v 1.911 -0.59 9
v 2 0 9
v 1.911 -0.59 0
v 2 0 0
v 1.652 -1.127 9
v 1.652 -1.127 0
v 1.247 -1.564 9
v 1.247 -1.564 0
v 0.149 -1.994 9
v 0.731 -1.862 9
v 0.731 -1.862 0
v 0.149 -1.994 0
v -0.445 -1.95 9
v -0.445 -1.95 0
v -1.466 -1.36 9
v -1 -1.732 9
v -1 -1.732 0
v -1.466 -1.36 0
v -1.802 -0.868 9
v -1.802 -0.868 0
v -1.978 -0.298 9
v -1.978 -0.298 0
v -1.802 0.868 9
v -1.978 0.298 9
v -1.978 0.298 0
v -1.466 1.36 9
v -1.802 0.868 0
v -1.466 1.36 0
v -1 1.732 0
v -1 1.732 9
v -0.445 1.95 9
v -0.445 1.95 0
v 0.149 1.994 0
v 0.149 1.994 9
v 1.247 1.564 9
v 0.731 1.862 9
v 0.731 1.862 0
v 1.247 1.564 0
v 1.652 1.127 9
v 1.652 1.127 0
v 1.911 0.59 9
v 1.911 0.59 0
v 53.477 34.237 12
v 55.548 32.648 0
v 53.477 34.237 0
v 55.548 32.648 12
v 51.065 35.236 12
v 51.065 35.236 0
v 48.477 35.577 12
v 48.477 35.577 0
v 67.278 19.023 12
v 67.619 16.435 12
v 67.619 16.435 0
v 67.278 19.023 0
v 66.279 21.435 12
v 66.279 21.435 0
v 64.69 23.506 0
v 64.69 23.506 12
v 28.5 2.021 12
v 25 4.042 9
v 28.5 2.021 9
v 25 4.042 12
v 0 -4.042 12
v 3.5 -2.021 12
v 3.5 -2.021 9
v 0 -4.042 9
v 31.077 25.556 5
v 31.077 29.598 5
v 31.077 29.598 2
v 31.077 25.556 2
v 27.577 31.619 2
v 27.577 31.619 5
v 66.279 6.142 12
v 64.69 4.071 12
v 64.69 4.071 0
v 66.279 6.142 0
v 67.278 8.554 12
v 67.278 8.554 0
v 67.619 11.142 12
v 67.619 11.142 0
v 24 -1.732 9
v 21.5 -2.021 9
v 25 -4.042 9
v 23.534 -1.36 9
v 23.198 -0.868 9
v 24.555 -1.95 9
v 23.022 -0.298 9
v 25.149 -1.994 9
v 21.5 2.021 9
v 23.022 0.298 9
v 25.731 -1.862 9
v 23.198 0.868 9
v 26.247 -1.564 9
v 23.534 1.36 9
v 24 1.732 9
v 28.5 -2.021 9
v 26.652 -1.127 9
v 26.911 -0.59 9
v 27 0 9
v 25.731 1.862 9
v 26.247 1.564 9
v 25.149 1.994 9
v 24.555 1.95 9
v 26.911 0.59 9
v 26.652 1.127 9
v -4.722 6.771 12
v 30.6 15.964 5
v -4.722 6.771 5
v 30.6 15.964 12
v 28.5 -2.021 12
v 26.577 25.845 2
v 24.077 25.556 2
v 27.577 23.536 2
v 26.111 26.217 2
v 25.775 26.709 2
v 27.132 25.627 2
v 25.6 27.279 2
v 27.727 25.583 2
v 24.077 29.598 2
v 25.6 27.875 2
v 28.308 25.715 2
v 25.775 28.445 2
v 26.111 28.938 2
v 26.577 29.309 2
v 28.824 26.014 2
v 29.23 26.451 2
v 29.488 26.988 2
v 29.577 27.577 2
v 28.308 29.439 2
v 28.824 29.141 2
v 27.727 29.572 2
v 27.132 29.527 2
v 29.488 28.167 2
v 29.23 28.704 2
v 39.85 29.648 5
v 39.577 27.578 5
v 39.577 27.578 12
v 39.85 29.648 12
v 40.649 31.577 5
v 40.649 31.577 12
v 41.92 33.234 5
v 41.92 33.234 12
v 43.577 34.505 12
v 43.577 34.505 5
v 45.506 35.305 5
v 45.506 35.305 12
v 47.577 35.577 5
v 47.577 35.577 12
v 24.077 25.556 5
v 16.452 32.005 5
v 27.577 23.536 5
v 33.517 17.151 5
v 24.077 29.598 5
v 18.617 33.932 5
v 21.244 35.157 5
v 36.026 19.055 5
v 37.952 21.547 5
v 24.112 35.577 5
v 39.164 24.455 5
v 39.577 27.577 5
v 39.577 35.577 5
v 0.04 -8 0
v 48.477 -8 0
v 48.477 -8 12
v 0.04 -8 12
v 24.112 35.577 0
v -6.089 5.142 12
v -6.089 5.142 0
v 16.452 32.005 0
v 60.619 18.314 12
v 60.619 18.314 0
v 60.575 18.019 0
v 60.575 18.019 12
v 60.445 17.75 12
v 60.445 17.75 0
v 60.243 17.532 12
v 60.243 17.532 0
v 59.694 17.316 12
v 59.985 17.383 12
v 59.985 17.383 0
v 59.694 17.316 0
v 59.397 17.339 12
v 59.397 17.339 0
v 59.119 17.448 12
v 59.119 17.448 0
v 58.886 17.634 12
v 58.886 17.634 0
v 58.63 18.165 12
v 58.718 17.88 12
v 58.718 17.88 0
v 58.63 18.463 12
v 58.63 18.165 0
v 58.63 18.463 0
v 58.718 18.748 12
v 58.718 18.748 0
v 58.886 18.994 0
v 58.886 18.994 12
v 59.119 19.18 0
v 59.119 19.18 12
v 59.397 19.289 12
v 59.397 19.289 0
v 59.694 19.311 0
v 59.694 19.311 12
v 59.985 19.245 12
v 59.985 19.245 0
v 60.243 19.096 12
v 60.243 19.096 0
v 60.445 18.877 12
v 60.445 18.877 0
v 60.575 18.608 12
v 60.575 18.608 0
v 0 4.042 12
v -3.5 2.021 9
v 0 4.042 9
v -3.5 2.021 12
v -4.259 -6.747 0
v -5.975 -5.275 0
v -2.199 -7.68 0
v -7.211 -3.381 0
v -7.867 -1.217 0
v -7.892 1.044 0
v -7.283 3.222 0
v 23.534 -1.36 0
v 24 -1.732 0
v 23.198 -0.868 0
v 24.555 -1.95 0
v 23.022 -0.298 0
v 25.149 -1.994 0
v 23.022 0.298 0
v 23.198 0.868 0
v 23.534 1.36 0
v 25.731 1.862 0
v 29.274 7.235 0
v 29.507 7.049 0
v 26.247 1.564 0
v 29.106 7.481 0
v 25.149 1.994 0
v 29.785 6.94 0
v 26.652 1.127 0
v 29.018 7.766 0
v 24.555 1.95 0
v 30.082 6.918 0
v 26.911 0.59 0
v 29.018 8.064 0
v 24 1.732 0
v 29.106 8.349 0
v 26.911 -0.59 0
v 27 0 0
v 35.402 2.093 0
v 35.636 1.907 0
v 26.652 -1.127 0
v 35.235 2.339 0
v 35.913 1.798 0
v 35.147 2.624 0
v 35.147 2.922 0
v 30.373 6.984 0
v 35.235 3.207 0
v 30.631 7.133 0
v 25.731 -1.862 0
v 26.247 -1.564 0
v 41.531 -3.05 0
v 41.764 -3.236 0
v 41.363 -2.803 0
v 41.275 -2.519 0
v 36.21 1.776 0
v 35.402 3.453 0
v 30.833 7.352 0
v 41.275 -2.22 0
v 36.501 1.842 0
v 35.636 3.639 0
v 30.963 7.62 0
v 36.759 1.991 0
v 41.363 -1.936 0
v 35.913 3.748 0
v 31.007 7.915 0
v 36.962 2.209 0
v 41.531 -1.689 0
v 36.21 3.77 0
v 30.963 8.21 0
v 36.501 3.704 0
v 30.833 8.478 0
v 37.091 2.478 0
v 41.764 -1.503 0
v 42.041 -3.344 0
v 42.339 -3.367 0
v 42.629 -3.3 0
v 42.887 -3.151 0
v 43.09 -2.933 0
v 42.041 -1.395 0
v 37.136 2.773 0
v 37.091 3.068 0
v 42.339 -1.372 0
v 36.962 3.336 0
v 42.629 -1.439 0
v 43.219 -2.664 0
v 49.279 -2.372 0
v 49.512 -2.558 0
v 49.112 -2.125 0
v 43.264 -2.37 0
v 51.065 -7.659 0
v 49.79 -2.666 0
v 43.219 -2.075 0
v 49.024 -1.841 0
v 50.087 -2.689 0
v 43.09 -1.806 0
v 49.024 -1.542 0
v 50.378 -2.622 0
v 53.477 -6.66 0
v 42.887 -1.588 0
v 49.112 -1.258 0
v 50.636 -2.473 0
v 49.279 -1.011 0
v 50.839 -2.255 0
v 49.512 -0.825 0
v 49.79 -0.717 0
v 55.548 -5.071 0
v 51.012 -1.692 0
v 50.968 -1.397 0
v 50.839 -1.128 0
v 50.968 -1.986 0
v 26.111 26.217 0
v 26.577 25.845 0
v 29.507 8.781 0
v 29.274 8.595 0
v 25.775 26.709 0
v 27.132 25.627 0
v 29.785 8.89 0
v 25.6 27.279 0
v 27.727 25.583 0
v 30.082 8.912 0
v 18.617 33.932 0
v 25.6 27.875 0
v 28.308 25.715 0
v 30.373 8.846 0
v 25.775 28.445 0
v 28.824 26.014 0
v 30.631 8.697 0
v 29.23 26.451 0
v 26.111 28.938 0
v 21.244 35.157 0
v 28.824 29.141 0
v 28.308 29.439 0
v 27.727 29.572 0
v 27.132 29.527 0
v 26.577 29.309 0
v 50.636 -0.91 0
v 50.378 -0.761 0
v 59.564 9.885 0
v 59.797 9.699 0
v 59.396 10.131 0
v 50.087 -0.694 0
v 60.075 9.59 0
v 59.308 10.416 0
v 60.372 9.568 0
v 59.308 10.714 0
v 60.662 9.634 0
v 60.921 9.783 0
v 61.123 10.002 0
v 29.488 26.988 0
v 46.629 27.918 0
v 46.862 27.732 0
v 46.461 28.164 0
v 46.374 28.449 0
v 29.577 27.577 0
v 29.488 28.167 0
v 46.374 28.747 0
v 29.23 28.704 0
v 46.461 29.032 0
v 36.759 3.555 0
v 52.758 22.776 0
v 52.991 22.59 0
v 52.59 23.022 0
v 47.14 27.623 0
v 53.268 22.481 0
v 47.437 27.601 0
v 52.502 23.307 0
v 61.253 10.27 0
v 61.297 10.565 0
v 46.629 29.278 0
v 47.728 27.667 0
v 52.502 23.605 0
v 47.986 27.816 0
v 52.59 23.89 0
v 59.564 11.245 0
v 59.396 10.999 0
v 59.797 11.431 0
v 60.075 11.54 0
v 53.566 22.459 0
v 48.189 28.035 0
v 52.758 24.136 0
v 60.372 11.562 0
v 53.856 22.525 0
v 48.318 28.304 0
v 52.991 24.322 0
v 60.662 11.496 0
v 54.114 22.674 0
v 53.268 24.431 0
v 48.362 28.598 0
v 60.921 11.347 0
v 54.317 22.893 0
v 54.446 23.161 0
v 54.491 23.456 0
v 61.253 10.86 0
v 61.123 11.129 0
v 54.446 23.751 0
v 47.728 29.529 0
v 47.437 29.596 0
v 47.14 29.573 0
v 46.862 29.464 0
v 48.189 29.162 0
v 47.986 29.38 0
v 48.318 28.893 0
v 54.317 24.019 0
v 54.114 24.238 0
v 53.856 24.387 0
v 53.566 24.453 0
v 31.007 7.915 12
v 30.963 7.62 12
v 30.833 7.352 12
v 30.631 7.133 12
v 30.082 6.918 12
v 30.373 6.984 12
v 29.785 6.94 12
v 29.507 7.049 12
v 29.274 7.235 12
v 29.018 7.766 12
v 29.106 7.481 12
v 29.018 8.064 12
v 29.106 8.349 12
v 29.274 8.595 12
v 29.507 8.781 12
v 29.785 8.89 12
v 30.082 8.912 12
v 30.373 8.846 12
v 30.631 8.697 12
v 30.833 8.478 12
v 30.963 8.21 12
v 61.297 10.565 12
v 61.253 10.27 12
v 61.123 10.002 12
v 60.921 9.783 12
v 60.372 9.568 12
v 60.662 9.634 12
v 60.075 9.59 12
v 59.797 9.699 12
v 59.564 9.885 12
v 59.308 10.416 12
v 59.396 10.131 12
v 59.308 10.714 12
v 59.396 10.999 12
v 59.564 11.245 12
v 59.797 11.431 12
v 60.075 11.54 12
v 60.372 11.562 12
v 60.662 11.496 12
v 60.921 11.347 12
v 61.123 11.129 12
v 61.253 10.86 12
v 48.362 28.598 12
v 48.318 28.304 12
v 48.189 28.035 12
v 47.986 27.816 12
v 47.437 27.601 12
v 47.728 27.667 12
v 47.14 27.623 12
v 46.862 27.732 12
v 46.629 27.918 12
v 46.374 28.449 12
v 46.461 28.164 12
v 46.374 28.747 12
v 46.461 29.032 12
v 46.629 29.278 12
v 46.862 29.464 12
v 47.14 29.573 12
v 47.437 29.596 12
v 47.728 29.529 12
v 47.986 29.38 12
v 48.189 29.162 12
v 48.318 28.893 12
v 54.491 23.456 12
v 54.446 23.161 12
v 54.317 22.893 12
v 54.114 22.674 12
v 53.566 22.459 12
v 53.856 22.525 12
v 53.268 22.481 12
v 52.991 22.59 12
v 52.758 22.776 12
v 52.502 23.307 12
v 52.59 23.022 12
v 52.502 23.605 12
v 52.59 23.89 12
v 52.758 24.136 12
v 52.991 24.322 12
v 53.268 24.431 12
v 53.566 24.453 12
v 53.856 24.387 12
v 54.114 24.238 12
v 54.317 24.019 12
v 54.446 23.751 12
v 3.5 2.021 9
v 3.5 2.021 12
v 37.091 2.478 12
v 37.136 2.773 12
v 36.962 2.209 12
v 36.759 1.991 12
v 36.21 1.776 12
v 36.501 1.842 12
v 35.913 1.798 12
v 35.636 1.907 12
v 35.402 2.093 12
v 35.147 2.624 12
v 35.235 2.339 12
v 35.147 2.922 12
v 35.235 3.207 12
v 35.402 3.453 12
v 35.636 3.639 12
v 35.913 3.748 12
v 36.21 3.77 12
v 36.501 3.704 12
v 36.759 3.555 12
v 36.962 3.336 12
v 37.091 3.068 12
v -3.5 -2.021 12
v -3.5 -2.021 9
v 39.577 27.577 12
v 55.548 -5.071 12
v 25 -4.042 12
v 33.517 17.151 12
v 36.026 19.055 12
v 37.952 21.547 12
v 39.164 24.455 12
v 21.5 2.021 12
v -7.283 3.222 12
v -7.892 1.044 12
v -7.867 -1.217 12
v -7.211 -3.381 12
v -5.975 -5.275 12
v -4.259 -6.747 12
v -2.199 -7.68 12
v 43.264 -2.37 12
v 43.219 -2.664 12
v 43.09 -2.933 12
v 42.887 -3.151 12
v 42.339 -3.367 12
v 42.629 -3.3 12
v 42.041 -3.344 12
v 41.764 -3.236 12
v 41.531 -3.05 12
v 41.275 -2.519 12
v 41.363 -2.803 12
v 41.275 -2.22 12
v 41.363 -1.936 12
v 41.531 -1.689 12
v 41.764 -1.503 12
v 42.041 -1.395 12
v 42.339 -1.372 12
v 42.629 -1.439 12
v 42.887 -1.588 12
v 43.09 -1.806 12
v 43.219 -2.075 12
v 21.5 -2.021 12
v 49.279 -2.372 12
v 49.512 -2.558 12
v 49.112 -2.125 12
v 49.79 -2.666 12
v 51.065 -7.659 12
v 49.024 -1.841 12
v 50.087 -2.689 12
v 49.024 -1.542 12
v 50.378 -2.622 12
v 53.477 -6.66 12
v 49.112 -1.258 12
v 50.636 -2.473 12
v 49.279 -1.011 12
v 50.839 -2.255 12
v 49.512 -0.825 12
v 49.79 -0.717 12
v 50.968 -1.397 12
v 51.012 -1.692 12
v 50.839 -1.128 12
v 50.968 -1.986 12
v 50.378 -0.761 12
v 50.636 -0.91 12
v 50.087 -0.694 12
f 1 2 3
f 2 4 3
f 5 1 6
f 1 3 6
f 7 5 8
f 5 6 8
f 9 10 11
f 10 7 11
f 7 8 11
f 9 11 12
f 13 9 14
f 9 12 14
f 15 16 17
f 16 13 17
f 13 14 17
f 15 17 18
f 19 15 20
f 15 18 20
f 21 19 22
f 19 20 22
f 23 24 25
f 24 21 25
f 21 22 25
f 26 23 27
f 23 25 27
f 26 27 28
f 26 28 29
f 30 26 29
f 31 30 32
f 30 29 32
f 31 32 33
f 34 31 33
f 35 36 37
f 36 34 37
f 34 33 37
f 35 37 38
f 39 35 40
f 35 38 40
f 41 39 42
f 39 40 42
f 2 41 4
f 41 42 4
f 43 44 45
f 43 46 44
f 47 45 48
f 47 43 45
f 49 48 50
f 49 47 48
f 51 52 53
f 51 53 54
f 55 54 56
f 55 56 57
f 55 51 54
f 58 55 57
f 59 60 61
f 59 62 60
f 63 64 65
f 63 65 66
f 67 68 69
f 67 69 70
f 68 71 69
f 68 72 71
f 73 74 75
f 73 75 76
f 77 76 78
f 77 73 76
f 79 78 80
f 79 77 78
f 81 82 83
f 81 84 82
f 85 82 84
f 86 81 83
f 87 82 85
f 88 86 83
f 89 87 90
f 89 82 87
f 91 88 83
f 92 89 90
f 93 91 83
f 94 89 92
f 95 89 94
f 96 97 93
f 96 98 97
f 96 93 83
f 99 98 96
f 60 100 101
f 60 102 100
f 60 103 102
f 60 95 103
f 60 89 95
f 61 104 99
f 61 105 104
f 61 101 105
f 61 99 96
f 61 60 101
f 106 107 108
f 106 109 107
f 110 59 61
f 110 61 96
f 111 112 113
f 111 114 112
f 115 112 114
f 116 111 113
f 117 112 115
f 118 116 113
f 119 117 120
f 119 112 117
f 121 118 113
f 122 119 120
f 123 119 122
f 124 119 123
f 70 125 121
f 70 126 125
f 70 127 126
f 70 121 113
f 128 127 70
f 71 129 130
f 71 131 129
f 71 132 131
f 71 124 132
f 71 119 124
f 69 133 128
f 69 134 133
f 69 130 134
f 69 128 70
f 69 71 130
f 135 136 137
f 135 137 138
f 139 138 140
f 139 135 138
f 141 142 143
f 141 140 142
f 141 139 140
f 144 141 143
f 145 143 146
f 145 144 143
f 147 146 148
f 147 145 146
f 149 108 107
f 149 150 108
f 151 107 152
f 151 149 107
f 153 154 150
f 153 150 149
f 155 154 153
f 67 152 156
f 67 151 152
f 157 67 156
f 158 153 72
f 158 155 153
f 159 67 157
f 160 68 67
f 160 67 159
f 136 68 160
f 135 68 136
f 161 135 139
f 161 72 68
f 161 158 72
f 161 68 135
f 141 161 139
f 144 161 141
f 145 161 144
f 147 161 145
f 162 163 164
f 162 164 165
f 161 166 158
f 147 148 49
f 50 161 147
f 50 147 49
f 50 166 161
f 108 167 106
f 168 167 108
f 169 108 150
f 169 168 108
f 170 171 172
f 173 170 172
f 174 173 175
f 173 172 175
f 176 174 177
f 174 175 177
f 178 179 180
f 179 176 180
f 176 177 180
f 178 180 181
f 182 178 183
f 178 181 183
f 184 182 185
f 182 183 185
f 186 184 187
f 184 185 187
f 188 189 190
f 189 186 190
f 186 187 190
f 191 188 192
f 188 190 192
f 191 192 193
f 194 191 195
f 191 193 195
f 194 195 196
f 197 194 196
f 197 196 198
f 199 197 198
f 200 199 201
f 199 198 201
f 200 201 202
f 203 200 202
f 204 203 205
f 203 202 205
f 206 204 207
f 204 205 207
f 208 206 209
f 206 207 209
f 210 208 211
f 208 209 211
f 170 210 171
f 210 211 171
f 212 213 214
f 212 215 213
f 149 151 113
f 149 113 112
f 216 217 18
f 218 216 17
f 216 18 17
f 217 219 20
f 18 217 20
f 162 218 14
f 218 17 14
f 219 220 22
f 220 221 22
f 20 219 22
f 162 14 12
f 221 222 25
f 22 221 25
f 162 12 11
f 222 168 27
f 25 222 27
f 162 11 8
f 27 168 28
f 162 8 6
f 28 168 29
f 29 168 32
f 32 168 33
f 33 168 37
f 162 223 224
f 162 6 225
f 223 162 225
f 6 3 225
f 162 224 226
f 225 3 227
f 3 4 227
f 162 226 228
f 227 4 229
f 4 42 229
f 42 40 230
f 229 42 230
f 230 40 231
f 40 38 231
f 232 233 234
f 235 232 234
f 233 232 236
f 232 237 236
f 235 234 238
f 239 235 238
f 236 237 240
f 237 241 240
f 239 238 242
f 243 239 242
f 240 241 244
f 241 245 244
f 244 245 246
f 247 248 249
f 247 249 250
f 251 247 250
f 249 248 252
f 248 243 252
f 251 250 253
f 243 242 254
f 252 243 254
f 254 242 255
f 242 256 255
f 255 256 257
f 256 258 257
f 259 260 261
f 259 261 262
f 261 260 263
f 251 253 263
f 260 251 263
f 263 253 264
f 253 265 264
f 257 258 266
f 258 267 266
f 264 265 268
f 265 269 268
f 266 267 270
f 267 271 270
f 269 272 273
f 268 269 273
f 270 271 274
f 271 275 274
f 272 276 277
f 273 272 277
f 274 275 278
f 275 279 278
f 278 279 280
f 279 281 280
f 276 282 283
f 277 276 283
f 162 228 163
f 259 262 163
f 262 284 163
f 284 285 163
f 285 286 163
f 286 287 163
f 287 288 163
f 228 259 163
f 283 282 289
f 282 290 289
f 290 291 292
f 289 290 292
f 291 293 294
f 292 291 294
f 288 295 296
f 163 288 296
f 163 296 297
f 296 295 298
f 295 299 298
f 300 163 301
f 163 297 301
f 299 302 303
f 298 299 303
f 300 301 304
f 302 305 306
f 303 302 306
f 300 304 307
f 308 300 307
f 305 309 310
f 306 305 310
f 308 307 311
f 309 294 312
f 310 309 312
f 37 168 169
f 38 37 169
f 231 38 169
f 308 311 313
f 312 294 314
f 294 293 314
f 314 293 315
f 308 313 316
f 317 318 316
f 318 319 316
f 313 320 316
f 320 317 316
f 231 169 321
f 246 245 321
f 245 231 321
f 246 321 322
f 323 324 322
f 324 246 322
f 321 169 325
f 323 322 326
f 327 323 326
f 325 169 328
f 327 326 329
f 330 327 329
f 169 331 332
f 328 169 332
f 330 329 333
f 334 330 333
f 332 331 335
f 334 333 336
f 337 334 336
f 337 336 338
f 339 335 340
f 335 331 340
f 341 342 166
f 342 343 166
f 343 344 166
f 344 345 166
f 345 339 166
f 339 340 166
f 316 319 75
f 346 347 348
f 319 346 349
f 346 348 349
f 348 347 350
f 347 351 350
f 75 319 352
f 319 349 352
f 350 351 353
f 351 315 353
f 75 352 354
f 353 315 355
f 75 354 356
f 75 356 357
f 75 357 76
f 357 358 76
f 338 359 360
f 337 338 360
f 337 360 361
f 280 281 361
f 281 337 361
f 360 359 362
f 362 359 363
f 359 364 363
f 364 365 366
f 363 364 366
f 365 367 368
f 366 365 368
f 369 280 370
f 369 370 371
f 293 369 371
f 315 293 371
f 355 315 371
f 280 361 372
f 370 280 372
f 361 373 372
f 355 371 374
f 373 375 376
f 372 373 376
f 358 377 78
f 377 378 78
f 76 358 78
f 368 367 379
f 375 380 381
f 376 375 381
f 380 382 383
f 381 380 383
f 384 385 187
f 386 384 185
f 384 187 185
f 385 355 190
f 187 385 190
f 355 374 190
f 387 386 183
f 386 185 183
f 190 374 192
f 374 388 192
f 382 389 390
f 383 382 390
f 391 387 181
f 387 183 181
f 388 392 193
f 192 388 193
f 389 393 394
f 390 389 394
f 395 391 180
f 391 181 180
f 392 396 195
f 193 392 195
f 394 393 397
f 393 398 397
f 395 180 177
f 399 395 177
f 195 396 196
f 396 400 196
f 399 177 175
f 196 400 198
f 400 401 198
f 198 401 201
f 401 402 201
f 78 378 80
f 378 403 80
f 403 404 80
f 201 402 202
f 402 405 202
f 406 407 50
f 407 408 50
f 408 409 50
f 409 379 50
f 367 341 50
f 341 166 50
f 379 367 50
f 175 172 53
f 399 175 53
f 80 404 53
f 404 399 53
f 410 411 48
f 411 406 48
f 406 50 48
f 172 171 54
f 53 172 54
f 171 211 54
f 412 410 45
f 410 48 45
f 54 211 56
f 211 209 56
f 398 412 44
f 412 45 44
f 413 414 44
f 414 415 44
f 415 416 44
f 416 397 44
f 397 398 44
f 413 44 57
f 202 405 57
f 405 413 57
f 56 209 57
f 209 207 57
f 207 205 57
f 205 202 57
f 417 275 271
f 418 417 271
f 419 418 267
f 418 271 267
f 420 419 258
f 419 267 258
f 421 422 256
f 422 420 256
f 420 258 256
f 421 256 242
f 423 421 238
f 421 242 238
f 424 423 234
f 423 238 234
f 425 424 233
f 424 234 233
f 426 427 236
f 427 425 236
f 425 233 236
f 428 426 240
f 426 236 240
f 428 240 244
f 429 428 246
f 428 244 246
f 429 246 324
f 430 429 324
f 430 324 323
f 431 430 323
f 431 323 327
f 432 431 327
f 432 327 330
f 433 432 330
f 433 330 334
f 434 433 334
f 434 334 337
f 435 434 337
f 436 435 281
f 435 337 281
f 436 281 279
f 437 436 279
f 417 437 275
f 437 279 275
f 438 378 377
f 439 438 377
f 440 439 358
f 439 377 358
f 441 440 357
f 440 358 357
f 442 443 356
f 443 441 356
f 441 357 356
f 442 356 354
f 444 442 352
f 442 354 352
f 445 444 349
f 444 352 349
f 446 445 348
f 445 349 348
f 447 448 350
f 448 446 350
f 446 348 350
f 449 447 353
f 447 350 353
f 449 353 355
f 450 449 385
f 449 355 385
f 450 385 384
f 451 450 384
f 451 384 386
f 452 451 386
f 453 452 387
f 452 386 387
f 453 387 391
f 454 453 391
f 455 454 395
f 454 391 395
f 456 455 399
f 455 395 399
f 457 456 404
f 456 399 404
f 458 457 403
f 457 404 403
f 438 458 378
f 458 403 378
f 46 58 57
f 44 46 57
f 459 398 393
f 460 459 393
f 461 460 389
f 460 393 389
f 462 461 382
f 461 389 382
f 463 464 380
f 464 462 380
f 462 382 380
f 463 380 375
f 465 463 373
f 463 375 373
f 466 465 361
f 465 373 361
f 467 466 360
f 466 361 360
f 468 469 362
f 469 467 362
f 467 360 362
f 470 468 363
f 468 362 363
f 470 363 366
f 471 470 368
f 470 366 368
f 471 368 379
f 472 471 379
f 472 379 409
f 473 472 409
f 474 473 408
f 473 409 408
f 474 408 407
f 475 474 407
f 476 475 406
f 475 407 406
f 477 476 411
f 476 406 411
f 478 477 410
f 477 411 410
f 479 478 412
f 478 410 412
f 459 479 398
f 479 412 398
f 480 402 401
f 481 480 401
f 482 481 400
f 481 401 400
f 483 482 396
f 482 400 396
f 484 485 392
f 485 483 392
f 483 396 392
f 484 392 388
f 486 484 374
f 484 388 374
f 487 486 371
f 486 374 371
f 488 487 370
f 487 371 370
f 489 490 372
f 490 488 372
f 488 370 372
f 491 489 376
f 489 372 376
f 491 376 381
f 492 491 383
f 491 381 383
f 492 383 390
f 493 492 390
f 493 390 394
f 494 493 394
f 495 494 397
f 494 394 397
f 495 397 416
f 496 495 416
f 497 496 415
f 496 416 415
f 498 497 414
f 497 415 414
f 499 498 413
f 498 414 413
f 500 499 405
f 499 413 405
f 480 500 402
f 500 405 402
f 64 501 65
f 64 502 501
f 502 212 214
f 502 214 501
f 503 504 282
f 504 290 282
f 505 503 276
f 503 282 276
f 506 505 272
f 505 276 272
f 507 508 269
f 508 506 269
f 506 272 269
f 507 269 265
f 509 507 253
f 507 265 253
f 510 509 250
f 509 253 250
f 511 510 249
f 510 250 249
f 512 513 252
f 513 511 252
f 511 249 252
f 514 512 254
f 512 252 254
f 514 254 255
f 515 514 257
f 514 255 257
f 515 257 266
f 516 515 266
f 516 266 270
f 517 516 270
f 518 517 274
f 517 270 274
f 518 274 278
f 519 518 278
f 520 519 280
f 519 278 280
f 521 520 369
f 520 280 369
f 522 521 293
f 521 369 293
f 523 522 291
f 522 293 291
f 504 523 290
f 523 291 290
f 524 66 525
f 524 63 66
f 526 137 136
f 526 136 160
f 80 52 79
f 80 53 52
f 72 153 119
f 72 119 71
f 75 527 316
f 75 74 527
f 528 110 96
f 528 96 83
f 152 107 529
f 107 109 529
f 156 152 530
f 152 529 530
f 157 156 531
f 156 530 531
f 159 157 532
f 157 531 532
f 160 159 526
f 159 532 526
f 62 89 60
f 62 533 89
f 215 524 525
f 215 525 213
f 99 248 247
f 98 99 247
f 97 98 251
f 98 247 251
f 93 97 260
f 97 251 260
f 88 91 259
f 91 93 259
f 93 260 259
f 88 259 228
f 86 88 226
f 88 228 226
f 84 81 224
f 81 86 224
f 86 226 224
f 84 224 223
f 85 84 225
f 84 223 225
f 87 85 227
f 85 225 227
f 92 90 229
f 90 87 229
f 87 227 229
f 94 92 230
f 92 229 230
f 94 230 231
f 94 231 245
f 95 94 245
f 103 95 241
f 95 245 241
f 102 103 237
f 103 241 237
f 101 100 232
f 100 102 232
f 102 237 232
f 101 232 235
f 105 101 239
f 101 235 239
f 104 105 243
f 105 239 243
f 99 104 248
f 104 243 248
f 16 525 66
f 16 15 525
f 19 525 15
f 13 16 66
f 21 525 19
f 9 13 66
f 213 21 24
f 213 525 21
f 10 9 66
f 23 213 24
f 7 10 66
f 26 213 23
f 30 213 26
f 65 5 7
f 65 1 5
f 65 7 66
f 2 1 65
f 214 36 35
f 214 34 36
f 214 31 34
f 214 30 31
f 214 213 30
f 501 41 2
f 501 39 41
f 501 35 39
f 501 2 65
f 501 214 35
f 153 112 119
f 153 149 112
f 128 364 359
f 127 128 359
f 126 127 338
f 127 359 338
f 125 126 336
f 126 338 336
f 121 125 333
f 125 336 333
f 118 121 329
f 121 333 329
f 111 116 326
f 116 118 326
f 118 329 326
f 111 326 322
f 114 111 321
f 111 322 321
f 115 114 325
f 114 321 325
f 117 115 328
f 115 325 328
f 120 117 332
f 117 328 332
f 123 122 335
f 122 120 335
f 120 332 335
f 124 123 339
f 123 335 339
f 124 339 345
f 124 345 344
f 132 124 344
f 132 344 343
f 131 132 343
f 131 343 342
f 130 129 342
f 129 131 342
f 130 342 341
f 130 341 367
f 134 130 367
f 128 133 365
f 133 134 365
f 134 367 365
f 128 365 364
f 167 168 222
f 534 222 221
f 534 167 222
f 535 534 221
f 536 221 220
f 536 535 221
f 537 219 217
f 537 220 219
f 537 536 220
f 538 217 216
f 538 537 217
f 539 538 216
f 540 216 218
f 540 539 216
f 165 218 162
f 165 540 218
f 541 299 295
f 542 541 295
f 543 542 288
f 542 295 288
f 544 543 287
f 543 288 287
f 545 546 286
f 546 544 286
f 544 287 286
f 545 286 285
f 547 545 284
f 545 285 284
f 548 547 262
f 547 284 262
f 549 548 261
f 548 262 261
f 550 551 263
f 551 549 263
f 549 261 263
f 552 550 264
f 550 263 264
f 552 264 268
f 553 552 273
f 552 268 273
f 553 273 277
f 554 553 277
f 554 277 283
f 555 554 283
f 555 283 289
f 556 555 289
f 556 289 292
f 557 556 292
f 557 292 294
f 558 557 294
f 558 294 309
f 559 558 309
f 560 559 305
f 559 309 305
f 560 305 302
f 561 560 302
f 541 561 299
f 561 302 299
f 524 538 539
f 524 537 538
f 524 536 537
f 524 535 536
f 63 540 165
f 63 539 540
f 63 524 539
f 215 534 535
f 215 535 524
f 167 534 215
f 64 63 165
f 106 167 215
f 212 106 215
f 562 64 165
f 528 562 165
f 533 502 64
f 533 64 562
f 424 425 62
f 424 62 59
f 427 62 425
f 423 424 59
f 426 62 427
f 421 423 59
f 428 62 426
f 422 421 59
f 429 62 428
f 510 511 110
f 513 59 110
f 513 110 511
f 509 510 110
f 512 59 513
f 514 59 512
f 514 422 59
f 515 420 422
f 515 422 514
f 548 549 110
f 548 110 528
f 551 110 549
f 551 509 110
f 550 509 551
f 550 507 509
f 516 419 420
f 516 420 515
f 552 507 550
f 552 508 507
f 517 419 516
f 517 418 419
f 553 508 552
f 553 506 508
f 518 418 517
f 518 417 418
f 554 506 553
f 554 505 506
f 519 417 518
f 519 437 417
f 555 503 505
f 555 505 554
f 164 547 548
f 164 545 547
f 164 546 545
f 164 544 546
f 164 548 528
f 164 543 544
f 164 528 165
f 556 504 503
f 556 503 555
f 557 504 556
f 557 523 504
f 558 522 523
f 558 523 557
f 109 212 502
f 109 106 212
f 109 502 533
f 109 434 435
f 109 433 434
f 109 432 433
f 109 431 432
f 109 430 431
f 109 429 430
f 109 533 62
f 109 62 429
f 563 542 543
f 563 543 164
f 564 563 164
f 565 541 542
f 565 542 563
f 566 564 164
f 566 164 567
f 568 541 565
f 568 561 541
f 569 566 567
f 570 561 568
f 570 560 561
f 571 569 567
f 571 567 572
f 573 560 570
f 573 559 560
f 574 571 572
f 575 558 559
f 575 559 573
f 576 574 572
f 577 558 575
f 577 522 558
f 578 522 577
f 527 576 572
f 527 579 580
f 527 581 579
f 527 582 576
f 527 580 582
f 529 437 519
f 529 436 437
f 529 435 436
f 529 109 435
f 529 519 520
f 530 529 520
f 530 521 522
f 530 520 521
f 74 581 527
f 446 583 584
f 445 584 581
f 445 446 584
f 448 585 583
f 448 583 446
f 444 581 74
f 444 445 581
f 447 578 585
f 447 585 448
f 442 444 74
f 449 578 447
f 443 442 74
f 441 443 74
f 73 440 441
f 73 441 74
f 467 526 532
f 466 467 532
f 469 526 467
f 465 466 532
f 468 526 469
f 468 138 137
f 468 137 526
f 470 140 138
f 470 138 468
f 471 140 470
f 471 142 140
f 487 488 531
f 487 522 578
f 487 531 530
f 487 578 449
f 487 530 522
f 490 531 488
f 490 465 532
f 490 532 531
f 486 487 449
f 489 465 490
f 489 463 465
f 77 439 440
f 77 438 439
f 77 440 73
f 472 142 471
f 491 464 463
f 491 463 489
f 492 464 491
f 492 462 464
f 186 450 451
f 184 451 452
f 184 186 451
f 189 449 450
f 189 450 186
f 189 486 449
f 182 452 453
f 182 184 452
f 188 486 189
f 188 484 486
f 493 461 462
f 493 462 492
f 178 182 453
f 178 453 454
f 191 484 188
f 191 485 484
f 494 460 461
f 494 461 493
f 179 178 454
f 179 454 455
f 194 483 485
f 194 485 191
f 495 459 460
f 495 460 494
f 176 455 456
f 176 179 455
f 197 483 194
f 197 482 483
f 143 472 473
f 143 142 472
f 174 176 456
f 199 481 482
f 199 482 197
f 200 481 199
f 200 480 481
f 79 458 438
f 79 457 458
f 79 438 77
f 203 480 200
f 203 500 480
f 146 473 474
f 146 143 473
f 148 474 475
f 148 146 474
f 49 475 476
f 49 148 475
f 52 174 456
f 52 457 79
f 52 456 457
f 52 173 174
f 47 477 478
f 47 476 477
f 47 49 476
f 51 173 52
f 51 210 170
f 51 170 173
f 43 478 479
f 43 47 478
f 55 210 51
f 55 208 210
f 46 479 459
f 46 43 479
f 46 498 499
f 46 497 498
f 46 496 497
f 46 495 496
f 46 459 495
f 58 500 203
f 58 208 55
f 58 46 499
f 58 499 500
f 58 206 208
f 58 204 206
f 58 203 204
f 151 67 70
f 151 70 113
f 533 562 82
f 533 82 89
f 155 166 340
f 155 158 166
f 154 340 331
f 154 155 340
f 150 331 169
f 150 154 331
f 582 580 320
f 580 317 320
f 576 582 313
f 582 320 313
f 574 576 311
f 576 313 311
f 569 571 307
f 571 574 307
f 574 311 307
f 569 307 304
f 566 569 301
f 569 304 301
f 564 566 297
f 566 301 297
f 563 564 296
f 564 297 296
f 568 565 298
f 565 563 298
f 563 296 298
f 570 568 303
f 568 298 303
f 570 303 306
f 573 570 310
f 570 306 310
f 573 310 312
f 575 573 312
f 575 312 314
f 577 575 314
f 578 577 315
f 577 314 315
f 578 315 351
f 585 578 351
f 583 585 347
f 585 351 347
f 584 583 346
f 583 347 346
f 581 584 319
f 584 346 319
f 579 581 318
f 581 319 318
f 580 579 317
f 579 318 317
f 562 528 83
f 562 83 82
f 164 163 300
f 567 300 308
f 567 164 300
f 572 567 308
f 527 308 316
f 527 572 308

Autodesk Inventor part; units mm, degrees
ref_plane "YZ Plane" through (0, 0, 0) normal (1, 0, 0) x (0, 1, 0)
ref_plane "XZ Plane" through (0, 0, 0) normal (0, 1, 0) x (-1, 0, 0)
ref_plane "XY Plane" through (0, 0, 0) normal (0, 0, 1) x (1, 0, 0)
sketch "Esquisse1" plane through (0, 0, 0) normal (0, 0, 1) x (1, 0, 0)
  circle A0 centre (0, 0) radius 2
  line L0 (0, 0) -> (46.5696, 0) construction
  line L1 (0, 0) -> (27.5772, 27.5772) construction
  circle A1 centre (27.5772, 27.5772) radius 2
  line L2 (27.5772, 27.5772) -> (55.1548, 4.4368) construction
  line L3 (27.5772, 27.5772) -> (45.4581, 27.5772) construction
  line L4 (0, 0) -> (0, -8) construction
  line L5 (0, 0) -> (-5.6569, 5.6569) construction
  line L6 (27.5772, 27.5772) -> (27.5772, 35.5772) construction
  line L7 (27.5772, 27.5772) -> (36.2548, 37.9188) construction
  line L8 (36.2548, 37.9188) -> (41.2341, 33.7406) construction
  line L9 (41.2341, 33.7406) -> (47.3624, 28.5983) construction
  line L10 (47.3624, 28.5983) -> (53.4908, 23.456) construction
  line L11 (53.4908, 23.456) -> (59.6192, 18.3137) construction
  line L12 (55.1548, 4.4368) -> (60.2971, 10.5652) construction
  circle A2 centre (41.2341, 33.7406) radius 1 construction
  circle A3 centre (47.3624, 28.5983) radius 1
  circle A4 centre (53.4908, 23.456) radius 1
  circle A5 centre (59.6192, 18.3137) radius 1
  circle A6 centre (60.2971, 10.5652) radius 1
  line L13 (59.6192, 18.3137) -> (67.6192, 18.3137) construction
  line L14 (67.6192, 35.5772) -> (67.6192, -8)
  line L15 (67.6192, -8) -> (-17.1163, -8)
  line L16 (-17.1163, -8) -> (19.4493, 35.5772)
  line L17 (19.4493, 35.5772) -> (67.6192, 35.5772)
  circle A7 centre (23.8788, 13.0574) radius 1 construction
  circle A8 centre (30.0072, 7.9151) radius 1
  circle A9 centre (36.1355, 2.7728) radius 1
  circle A10 centre (42.2639, -2.3695) radius 1
  circle A11 centre (50.0125, -1.6915) radius 1
  line L18 (0, 0) -> (25, 0) construction
  circle A12 centre (25, 0) radius 2
  dimension "d0" = 4
  dimension "d1" = 39
  dimension "d2" = 45
  dimension "d3" = 36
  dimension "d4" = 40
  dimension "d5" = 8
  dimension "d6" = 8
  dimension "d7" = 8
  dimension "d8" = 13.5
  dimension "d9" = 6.5
  dimension "d10" = 8
  dimension "d11" = 8
  dimension "d12" = 8
  dimension "d13" = 8
  dimension "d14" = 2
  dimension "d15" = 8
  dimension "d16" = 25
extrude "Extrusion1" add sketch "Esquisse1" along normal blind 12
sketch "Esquisse4" plane through (0, 0, 12) normal (0, 0, 1) x (1, 0, 0)
  circle A0 centre (27.5772, 27.5772) radius 2 projected
  circle A1 centre (0, 0) radius 2 projected
  line L0 (67.6192, 35.5772) -> (19.4493, 35.5772) projected
  line L1 (19.4493, 35.5772) -> (-17.1163, -8) projected
  circle A2 centre (27.5772, 27.5772) radius 12 construction
  line L2 (39.5772, 35.5772) -> (39.5772, 27.5772)
  line L3 (30.5997, 15.964) -> (-4.7219, 6.771)
  arc A3 (30.5997, 15.964) -> (39.5772, 27.5772) centre (27.5772, 27.5772) ccw
  line L4 (-17.1163, -8) -> (67.6192, -8) projected
  line L5 (0, 0) -> (0, 8) construction
  dimension "d42" = 24
  dimension "d51" = 8
extrude "Extrusion4" cut sketch "Esquisse4" against normal blind 7 contours L2 A3 L3 L1 L0
sketch "Esquisse5" plane through (0, 0, 12) normal (0, 0, 1) x (1, 0, 0)
  line L0 (67.6192, -8) -> (67.6192, 35.5772) projected
  circle A0 centre (0, 0) radius 2 projected
  circle A1 centre (25, 0) radius 2 projected
  line L1 (28.5, -2.0207) -> (25, -4.0415)
  line L2 (25, -4.0415) -> (21.5, -2.0207)
  line L3 (21.5, -2.0207) -> (21.5, 2.0207)
  line L4 (21.5, 2.0207) -> (25, 4.0415)
  line L5 (25, 4.0415) -> (28.5, 2.0207)
  line L6 (28.5, 2.0207) -> (28.5, -2.0207)
  line L7 (3.5, -2.0207) -> (0, -4.0415)
  line L8 (0, -4.0415) -> (-3.5, -2.0207)
  line L9 (-3.5, -2.0207) -> (-3.5, 2.0207)
  line L10 (-3.5, 2.0207) -> (0, 4.0415)
  line L11 (0, 4.0415) -> (3.5, 2.0207)
  line L12 (3.5, 2.0207) -> (3.5, -2.0207)
  line L13 (21.5, 2.0207) -> (28.5, 2.0207) construction
  dimension "d46" = 7
extrude "Extrusion5" cut sketch "Esquisse5" against normal blind 3
sketch "Esquisse6" plane through (0, 0, 5) normal (0, 0, 1) x (1, 0, 0)
  circle A0 centre (27.5772, 27.5772) radius 2 projected
  arc A1 (30.5997, 15.964) -> (39.5772, 27.5772) centre (27.5772, 27.5772) ccw projected
  line L0 (31.0772, 29.5979) -> (31.0772, 25.5564)
  line L1 (31.0772, 25.5564) -> (27.5772, 23.5357)
  line L2 (27.5772, 23.5357) -> (24.0772, 25.5564)
  line L3 (24.0772, 25.5564) -> (24.0772, 29.5979)
  line L4 (24.0772, 29.5979) -> (27.5772, 31.6186)
  line L5 (27.5772, 31.6186) -> (31.0772, 29.5979)
  line L6 (67.6192, -8) -> (67.6192, 35.5772) projected
  line L7 (0, 4.0415) -> (3.5, 2.0207) projected
  point P0 (0, 0)
extrude "Extrusion6" cut sketch "Esquisse6" against normal blind 3
fillet "Congé10" radius 8 1 edges at (-17.1163, -8, 6)
chamfer "Chanfrein3" distance 15 angle 45 1 edges at (67.6192, -8, 6)
chamfer "Chanfrein4" distance 15 angle 45 1 edges at (67.6192, 35.5772, 6)
fillet "Congé11" radius 10 1 edges at (52.6192, -8, 6)
fillet "Congé12" radius 10 1 edges at (67.6192, 7, 6)
fillet "Congé13" radius 10 1 edges at (67.6192, 20.5772, 6)
fillet "Congé14" radius 10 1 edges at (52.6192, 35.5772, 6)
fillet "Congé15" radius 10 1 edges at (19.4493, 35.5772, 2.5)
fillet "Congé16" radius 8 1 edges at (39.5772, 35.5772, 8.5)
properties part number "joint1right+ax12imprint_v3"
